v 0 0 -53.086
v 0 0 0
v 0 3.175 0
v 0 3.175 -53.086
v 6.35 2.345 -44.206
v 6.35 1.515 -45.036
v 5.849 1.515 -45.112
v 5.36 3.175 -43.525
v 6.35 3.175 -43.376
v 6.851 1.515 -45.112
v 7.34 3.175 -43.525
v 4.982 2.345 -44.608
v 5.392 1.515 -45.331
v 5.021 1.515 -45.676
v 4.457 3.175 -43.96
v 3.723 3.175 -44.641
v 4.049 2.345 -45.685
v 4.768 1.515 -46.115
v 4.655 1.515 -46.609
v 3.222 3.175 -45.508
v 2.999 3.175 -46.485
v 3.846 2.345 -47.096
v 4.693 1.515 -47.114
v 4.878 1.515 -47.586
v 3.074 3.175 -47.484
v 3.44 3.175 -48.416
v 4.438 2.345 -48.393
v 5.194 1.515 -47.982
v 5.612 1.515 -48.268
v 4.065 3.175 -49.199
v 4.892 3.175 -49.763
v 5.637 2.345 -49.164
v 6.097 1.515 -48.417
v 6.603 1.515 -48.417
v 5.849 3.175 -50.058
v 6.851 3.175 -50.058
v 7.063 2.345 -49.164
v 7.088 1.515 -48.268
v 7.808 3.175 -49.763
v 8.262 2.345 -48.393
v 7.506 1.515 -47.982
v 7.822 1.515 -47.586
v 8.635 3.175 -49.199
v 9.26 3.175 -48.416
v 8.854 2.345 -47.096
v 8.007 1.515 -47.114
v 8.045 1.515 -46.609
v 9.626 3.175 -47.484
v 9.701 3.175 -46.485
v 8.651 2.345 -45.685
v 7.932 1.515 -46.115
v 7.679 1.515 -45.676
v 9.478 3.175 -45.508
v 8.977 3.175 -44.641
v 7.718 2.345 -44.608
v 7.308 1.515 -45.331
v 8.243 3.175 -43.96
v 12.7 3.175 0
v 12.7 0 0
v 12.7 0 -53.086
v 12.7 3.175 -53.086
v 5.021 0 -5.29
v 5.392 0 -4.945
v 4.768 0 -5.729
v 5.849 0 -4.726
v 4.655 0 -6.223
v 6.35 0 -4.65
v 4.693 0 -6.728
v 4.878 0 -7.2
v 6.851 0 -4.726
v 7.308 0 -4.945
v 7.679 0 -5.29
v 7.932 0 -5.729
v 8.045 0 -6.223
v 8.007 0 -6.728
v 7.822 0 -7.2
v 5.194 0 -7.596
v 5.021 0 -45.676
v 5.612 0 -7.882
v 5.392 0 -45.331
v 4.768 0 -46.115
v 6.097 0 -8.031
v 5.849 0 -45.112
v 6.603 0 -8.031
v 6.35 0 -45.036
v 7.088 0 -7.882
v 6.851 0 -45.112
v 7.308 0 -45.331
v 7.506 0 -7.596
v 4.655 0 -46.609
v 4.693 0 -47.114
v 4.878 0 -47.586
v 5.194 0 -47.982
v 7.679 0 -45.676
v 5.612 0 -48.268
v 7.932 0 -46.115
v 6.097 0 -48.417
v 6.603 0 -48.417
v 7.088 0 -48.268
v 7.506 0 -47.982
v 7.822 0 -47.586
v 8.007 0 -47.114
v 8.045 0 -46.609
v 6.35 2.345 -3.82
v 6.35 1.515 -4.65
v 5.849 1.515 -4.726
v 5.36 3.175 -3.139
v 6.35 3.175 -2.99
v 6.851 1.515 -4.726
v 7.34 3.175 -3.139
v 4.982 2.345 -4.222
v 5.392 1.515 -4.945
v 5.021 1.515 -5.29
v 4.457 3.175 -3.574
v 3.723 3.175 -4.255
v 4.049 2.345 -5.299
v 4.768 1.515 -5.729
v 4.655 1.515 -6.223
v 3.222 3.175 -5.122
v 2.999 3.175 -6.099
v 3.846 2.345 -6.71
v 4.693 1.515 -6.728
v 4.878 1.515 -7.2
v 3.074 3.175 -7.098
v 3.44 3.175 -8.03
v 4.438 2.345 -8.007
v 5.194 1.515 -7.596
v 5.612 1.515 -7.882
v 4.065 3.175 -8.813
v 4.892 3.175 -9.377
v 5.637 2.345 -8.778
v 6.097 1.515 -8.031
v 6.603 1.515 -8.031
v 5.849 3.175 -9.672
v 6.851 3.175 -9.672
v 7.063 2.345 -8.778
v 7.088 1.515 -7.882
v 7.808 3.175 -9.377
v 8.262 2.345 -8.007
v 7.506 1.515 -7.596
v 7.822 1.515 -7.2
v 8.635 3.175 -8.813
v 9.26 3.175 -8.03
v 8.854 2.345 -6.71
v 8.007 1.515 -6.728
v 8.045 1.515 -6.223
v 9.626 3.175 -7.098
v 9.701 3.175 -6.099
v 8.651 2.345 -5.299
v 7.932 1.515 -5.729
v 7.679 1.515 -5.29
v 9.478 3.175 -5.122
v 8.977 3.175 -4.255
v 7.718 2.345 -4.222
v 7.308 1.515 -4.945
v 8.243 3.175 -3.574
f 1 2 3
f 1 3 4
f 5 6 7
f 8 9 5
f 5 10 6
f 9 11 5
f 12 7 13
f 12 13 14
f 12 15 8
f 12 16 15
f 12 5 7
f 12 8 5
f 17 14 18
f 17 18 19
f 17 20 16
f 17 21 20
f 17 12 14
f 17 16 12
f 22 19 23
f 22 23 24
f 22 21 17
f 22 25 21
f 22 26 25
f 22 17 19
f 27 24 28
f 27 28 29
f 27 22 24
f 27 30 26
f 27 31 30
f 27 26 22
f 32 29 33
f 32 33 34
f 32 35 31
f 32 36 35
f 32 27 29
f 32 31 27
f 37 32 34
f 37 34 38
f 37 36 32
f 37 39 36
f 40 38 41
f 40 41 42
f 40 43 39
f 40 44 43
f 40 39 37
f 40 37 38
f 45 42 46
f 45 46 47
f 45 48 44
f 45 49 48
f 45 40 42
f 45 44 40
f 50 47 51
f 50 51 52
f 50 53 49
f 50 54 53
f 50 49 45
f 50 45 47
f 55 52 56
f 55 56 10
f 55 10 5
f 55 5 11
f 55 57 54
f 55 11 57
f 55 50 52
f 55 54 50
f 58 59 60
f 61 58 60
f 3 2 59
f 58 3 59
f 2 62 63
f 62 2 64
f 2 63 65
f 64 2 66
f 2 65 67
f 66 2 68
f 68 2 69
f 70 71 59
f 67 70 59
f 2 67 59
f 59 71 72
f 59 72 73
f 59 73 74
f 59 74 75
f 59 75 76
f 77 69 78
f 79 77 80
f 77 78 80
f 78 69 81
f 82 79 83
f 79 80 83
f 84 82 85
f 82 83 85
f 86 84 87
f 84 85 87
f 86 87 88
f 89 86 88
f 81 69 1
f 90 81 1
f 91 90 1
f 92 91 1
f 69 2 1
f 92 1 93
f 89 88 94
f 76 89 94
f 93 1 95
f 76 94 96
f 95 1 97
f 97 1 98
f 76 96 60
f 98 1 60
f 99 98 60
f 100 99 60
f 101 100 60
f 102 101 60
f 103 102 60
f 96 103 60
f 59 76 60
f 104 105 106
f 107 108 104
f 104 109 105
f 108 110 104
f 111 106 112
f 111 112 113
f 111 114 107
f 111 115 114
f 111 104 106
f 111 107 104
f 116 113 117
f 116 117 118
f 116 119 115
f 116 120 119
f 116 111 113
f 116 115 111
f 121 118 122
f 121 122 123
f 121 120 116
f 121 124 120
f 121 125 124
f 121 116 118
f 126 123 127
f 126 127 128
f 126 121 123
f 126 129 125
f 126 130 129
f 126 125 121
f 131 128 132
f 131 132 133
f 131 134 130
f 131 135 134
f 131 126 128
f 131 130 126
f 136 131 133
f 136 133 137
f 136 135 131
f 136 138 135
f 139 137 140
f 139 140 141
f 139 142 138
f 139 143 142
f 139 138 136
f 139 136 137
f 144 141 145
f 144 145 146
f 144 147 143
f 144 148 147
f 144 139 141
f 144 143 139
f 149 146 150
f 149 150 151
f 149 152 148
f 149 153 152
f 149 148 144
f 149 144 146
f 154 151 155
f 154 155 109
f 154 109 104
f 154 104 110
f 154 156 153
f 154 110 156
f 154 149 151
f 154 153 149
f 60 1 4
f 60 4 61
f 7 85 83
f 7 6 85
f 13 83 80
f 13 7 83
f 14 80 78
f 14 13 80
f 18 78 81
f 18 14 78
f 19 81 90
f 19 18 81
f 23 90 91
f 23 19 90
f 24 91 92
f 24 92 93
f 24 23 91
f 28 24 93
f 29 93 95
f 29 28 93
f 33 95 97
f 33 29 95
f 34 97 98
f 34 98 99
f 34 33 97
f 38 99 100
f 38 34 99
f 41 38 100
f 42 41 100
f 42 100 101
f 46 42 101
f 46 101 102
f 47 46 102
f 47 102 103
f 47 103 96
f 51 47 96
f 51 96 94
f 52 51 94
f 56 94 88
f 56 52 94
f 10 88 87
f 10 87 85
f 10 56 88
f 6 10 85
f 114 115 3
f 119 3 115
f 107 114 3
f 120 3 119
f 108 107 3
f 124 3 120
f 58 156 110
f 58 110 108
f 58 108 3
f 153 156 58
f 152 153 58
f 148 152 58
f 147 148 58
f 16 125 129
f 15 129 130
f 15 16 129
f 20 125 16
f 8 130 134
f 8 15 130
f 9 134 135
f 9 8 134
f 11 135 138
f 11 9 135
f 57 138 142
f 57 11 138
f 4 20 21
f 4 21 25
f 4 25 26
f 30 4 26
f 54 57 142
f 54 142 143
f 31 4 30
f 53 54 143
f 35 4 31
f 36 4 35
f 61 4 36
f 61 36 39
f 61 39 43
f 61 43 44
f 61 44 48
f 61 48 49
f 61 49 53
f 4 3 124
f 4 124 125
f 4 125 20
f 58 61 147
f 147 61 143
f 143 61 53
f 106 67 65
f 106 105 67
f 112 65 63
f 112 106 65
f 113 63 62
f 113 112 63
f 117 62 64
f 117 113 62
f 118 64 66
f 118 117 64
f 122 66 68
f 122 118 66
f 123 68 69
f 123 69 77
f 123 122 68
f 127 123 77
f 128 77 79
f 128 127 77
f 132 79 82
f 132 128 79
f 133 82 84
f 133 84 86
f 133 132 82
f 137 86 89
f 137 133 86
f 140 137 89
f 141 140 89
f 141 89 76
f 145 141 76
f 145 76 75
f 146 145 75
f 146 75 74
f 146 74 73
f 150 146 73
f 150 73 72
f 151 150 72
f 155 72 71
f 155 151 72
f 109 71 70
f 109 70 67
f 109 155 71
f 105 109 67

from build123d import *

# Parameters (mm, degrees)
SKETCH1_W                    = 12.7
SKETCH1_H                    = 53.086
BOSS_EXTRUDE1_DEPTH          = 3.175
CSK_FOR_M3_SFHCS1_AT_2_COUNT = 2
CSK_FOR_M3_SFHCS1_AT_2_PITCH = 40.386


with BuildPart() as part:
    # Sketch1 → Boss-Extrude1 (new body)
    with BuildSketch(Plane(origin=(0, 0, 0), x_dir=(1, 0, 0), z_dir=(0, 1, 0))):
        with Locations((6.35, 26.543)):
            Rectangle(SKETCH1_W, SKETCH1_H)
    extrude(amount=BOSS_EXTRUDE1_DEPTH)

    # Sketch2 → CSK for M3 SFHCS1 (revolve, cut)
    with BuildSketch(Plane(origin=(6.35, 3.175, -6.35), x_dir=(0, 0, 1), z_dir=(1, 0, 0))):
        Polygon((0, 0), (0, 3.175), (1.7, 3.175), (1.7, 1.66), (3.36, 0), align=None)
    csk_for_m3_sfhcs1 = revolve(axis=Axis((6.35, 9.525, -6.35), (0, -1, 0)), mode=Mode.SUBTRACT)

    # CSK for M3 SFHCS1 at 2: CSK for M3 SFHCS1 ×2
    with Locations(*[(0, 0, -i * CSK_FOR_M3_SFHCS1_AT_2_PITCH) for i in range(1, CSK_FOR_M3_SFHCS1_AT_2_COUNT)]):
        add(csk_for_m3_sfhcs1, mode=Mode.SUBTRACT)


solid = part.part
